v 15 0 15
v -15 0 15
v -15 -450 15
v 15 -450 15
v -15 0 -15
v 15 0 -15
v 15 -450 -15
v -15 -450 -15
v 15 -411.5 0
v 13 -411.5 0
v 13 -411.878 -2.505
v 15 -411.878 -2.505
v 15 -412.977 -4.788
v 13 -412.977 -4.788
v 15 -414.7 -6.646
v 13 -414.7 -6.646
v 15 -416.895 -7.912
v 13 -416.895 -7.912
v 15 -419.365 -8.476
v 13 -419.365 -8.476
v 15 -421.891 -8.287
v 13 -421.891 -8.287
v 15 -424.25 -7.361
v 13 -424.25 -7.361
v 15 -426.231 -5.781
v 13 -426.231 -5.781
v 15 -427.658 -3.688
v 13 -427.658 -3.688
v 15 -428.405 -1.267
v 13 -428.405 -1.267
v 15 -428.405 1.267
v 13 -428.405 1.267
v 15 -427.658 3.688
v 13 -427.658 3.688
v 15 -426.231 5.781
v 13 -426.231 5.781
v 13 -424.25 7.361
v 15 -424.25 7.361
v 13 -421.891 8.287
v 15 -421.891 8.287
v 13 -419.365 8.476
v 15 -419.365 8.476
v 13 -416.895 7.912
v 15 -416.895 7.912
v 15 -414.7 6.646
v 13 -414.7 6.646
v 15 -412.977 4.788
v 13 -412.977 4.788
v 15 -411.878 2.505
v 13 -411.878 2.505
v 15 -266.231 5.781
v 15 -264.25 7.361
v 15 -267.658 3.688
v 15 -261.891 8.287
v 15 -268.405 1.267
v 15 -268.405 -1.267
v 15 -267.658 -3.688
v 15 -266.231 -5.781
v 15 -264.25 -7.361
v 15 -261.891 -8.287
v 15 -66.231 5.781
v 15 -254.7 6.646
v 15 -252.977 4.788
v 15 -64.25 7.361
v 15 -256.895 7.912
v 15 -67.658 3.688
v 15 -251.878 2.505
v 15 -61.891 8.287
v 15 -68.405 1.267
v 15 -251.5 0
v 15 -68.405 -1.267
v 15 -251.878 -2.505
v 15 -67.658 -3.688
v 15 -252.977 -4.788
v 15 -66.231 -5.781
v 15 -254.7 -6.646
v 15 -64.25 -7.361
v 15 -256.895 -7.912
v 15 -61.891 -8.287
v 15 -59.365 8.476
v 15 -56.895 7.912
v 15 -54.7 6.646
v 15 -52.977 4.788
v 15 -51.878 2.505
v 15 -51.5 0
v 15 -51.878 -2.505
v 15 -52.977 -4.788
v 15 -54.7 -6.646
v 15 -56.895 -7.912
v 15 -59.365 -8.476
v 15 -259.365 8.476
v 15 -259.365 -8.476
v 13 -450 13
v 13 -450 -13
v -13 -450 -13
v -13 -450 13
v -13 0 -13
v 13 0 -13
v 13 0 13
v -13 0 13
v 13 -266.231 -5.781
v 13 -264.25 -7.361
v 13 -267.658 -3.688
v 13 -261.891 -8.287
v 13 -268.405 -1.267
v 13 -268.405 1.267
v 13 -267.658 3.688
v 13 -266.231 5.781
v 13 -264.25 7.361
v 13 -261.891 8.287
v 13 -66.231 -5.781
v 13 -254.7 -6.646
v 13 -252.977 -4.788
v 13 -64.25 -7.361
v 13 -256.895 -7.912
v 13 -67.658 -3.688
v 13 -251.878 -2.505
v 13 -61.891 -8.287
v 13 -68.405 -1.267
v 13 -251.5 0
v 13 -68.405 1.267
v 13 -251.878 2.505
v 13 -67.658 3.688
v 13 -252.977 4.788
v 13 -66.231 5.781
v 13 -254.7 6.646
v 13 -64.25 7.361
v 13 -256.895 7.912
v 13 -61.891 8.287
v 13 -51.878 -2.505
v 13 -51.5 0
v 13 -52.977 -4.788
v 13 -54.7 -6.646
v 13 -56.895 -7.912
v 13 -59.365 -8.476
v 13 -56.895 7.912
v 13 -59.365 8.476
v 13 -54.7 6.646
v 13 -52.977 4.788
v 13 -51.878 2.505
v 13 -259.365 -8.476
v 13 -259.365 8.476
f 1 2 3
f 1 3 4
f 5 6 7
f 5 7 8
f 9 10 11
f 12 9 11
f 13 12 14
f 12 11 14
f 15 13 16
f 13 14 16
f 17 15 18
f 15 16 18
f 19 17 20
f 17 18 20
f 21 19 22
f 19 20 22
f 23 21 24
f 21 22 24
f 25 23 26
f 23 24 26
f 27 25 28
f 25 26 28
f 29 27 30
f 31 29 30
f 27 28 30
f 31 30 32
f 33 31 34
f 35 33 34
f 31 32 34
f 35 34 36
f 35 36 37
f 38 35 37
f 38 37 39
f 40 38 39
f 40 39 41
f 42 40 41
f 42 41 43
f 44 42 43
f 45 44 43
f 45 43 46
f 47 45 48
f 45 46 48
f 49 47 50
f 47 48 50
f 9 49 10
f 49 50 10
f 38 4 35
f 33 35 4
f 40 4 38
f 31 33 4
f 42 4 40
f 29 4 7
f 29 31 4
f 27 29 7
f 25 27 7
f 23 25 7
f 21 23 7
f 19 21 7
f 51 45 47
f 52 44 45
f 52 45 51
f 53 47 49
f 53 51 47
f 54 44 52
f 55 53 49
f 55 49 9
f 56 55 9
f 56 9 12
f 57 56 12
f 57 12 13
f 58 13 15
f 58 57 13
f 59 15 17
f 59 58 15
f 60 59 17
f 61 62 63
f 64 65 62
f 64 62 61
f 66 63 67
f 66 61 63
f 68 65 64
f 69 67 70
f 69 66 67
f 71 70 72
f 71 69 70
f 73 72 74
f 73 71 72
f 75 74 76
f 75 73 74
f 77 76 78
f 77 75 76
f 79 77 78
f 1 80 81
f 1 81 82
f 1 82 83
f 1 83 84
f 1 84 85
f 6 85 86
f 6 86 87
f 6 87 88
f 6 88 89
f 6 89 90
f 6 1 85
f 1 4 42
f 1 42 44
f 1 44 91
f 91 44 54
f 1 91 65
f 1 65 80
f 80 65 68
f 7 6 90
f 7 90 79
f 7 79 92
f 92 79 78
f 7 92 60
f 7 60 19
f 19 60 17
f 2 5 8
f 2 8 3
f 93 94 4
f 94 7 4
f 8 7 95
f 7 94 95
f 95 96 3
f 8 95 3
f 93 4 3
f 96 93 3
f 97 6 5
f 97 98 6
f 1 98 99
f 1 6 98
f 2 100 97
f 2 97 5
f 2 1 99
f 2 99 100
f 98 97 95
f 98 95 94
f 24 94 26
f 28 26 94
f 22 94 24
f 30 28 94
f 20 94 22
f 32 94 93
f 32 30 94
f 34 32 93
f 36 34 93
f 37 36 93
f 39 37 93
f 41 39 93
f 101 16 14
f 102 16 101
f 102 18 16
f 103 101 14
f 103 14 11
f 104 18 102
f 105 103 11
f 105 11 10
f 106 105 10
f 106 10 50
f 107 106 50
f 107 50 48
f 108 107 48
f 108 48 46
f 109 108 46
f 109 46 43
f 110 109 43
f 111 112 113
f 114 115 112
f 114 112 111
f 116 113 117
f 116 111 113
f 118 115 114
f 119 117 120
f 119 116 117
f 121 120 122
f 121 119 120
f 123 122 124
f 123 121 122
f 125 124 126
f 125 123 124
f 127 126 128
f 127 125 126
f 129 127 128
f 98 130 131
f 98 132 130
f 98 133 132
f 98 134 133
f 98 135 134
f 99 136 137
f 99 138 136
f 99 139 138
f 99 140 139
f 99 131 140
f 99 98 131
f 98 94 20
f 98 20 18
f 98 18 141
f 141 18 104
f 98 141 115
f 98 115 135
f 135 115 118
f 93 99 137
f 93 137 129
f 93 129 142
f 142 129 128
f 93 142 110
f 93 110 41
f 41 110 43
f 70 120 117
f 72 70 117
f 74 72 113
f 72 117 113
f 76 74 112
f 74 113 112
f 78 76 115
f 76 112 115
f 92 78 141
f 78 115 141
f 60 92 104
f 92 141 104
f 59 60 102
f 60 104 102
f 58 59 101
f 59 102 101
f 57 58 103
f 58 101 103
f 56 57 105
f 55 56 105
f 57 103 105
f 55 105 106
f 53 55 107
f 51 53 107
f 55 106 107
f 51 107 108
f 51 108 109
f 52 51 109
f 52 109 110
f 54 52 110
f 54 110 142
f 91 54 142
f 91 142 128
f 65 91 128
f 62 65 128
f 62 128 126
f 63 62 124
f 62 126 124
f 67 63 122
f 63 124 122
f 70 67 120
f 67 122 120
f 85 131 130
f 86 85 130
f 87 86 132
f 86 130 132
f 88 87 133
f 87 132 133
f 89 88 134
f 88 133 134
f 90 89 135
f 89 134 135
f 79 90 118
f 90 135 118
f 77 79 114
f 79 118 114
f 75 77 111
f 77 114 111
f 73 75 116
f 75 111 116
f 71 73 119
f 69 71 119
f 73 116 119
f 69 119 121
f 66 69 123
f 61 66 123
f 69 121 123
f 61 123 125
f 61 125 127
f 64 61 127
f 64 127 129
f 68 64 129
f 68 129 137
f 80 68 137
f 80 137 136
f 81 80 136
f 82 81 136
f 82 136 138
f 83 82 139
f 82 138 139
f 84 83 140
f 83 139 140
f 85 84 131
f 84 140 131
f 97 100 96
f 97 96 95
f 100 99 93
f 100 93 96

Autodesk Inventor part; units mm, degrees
ref_plane "YZ Plane" through (0, 0, 0) normal (1, 0, 0) x (0, 1, 0)
ref_plane "XZ Plane" through (0, 0, 0) normal (0, 1, 0) x (-1, 0, 0)
ref_plane "XY Plane" through (0, 0, 0) normal (0, 0, 1) x (1, 0, 0)
sketch "Sketch9" plane through (0, 0, 0) normal (0, 1, 0) x (-1, 0, 0)
  line L0 (15, 15) -> (-15, 15)
  line L1 (-15, 15) -> (-15, -15)
  line L2 (-15, -15) -> (15, -15)
  line L3 (15, -15) -> (15, 15)
  line L4 (15, 15) -> (-15, -15) construction
  line L5 (-15, 15) -> (15, -15) construction
  line L6 (-13, 13) -> (13, 13)
  line L7 (13, 13) -> (13, -13)
  line L8 (13, -13) -> (-13, -13)
  line L9 (-13, -13) -> (-13, 13)
  point P0 (0, 0)
  dimension "d172" = 30
  dimension "d173" = 30
  dimension "d174" = 2
extrude "Extrusion3" add sketch "Sketch9" against normal blind 450
sketch "Sketch10" plane through (0, 0, 0) normal (1, 0, 0) x (0, 1, 0)
  line L0 (0, 15) -> (0, -15) construction
  line L1 (0, 15) -> (-450, 15) construction
  line L2 (-450, -15) -> (-450, 15) construction
  line L3 (0, -15) -> (-450, -15) construction
  line L4 (-68.5, 8.5) -> (-51.5, 8.5)
  line L5 (-51.5, 8.5) -> (-51.5, -8.5)
  line L6 (-51.5, -8.5) -> (-68.5, -8.5)
  line L7 (-68.5, -8.5) -> (-68.5, 8.5)
  line L8 (-68.5, 8.5) -> (-51.5, -8.5) construction
  line L9 (-51.5, 8.5) -> (-68.5, -8.5) construction
  line L10 (-268.5, 8.5) -> (-251.5, 8.5)
  line L11 (-251.5, 8.5) -> (-251.5, -8.5)
  line L12 (-251.5, -8.5) -> (-268.5, -8.5)
  line L13 (-268.5, -8.5) -> (-268.5, 8.5)
  line L14 (-268.5, 8.5) -> (-251.5, -8.5) construction
  line L15 (-251.5, 8.5) -> (-268.5, -8.5) construction
  line L16 (-428.5, 8.5) -> (-411.5, 8.5)
  line L17 (-411.5, 8.5) -> (-411.5, -8.5)
  line L18 (-411.5, -8.5) -> (-428.5, -8.5)
  line L19 (-428.5, -8.5) -> (-428.5, 8.5)
  line L20 (-428.5, 8.5) -> (-411.5, -8.5) construction
  line L21 (-411.5, 8.5) -> (-428.5, -8.5) construction
  circle A0 centre (-470, 0) radius 8.5
  line L22 (0, 0) -> (30, 0)
  circle A1 centre (-60, 0) radius 8.5
  circle A2 centre (-260, 0) radius 8.5
  circle A3 centre (-420, 0) radius 8.5
  dimension "d177" = 17
  dimension "d178" = 17
  dimension "d181" = 30
  dimension "d182" = 90
  dimension "d183" = 290
  dimension "d184" = 450
  dimension "d185" = 500
  dimension "d186" = 17
extrude "Extrusion4" cut sketch "Sketch10" along normal through all contours A1 | A2 | A3
properties part number "PNS 755 FDS 1200 way tube 2" material "Stainless Steel"
